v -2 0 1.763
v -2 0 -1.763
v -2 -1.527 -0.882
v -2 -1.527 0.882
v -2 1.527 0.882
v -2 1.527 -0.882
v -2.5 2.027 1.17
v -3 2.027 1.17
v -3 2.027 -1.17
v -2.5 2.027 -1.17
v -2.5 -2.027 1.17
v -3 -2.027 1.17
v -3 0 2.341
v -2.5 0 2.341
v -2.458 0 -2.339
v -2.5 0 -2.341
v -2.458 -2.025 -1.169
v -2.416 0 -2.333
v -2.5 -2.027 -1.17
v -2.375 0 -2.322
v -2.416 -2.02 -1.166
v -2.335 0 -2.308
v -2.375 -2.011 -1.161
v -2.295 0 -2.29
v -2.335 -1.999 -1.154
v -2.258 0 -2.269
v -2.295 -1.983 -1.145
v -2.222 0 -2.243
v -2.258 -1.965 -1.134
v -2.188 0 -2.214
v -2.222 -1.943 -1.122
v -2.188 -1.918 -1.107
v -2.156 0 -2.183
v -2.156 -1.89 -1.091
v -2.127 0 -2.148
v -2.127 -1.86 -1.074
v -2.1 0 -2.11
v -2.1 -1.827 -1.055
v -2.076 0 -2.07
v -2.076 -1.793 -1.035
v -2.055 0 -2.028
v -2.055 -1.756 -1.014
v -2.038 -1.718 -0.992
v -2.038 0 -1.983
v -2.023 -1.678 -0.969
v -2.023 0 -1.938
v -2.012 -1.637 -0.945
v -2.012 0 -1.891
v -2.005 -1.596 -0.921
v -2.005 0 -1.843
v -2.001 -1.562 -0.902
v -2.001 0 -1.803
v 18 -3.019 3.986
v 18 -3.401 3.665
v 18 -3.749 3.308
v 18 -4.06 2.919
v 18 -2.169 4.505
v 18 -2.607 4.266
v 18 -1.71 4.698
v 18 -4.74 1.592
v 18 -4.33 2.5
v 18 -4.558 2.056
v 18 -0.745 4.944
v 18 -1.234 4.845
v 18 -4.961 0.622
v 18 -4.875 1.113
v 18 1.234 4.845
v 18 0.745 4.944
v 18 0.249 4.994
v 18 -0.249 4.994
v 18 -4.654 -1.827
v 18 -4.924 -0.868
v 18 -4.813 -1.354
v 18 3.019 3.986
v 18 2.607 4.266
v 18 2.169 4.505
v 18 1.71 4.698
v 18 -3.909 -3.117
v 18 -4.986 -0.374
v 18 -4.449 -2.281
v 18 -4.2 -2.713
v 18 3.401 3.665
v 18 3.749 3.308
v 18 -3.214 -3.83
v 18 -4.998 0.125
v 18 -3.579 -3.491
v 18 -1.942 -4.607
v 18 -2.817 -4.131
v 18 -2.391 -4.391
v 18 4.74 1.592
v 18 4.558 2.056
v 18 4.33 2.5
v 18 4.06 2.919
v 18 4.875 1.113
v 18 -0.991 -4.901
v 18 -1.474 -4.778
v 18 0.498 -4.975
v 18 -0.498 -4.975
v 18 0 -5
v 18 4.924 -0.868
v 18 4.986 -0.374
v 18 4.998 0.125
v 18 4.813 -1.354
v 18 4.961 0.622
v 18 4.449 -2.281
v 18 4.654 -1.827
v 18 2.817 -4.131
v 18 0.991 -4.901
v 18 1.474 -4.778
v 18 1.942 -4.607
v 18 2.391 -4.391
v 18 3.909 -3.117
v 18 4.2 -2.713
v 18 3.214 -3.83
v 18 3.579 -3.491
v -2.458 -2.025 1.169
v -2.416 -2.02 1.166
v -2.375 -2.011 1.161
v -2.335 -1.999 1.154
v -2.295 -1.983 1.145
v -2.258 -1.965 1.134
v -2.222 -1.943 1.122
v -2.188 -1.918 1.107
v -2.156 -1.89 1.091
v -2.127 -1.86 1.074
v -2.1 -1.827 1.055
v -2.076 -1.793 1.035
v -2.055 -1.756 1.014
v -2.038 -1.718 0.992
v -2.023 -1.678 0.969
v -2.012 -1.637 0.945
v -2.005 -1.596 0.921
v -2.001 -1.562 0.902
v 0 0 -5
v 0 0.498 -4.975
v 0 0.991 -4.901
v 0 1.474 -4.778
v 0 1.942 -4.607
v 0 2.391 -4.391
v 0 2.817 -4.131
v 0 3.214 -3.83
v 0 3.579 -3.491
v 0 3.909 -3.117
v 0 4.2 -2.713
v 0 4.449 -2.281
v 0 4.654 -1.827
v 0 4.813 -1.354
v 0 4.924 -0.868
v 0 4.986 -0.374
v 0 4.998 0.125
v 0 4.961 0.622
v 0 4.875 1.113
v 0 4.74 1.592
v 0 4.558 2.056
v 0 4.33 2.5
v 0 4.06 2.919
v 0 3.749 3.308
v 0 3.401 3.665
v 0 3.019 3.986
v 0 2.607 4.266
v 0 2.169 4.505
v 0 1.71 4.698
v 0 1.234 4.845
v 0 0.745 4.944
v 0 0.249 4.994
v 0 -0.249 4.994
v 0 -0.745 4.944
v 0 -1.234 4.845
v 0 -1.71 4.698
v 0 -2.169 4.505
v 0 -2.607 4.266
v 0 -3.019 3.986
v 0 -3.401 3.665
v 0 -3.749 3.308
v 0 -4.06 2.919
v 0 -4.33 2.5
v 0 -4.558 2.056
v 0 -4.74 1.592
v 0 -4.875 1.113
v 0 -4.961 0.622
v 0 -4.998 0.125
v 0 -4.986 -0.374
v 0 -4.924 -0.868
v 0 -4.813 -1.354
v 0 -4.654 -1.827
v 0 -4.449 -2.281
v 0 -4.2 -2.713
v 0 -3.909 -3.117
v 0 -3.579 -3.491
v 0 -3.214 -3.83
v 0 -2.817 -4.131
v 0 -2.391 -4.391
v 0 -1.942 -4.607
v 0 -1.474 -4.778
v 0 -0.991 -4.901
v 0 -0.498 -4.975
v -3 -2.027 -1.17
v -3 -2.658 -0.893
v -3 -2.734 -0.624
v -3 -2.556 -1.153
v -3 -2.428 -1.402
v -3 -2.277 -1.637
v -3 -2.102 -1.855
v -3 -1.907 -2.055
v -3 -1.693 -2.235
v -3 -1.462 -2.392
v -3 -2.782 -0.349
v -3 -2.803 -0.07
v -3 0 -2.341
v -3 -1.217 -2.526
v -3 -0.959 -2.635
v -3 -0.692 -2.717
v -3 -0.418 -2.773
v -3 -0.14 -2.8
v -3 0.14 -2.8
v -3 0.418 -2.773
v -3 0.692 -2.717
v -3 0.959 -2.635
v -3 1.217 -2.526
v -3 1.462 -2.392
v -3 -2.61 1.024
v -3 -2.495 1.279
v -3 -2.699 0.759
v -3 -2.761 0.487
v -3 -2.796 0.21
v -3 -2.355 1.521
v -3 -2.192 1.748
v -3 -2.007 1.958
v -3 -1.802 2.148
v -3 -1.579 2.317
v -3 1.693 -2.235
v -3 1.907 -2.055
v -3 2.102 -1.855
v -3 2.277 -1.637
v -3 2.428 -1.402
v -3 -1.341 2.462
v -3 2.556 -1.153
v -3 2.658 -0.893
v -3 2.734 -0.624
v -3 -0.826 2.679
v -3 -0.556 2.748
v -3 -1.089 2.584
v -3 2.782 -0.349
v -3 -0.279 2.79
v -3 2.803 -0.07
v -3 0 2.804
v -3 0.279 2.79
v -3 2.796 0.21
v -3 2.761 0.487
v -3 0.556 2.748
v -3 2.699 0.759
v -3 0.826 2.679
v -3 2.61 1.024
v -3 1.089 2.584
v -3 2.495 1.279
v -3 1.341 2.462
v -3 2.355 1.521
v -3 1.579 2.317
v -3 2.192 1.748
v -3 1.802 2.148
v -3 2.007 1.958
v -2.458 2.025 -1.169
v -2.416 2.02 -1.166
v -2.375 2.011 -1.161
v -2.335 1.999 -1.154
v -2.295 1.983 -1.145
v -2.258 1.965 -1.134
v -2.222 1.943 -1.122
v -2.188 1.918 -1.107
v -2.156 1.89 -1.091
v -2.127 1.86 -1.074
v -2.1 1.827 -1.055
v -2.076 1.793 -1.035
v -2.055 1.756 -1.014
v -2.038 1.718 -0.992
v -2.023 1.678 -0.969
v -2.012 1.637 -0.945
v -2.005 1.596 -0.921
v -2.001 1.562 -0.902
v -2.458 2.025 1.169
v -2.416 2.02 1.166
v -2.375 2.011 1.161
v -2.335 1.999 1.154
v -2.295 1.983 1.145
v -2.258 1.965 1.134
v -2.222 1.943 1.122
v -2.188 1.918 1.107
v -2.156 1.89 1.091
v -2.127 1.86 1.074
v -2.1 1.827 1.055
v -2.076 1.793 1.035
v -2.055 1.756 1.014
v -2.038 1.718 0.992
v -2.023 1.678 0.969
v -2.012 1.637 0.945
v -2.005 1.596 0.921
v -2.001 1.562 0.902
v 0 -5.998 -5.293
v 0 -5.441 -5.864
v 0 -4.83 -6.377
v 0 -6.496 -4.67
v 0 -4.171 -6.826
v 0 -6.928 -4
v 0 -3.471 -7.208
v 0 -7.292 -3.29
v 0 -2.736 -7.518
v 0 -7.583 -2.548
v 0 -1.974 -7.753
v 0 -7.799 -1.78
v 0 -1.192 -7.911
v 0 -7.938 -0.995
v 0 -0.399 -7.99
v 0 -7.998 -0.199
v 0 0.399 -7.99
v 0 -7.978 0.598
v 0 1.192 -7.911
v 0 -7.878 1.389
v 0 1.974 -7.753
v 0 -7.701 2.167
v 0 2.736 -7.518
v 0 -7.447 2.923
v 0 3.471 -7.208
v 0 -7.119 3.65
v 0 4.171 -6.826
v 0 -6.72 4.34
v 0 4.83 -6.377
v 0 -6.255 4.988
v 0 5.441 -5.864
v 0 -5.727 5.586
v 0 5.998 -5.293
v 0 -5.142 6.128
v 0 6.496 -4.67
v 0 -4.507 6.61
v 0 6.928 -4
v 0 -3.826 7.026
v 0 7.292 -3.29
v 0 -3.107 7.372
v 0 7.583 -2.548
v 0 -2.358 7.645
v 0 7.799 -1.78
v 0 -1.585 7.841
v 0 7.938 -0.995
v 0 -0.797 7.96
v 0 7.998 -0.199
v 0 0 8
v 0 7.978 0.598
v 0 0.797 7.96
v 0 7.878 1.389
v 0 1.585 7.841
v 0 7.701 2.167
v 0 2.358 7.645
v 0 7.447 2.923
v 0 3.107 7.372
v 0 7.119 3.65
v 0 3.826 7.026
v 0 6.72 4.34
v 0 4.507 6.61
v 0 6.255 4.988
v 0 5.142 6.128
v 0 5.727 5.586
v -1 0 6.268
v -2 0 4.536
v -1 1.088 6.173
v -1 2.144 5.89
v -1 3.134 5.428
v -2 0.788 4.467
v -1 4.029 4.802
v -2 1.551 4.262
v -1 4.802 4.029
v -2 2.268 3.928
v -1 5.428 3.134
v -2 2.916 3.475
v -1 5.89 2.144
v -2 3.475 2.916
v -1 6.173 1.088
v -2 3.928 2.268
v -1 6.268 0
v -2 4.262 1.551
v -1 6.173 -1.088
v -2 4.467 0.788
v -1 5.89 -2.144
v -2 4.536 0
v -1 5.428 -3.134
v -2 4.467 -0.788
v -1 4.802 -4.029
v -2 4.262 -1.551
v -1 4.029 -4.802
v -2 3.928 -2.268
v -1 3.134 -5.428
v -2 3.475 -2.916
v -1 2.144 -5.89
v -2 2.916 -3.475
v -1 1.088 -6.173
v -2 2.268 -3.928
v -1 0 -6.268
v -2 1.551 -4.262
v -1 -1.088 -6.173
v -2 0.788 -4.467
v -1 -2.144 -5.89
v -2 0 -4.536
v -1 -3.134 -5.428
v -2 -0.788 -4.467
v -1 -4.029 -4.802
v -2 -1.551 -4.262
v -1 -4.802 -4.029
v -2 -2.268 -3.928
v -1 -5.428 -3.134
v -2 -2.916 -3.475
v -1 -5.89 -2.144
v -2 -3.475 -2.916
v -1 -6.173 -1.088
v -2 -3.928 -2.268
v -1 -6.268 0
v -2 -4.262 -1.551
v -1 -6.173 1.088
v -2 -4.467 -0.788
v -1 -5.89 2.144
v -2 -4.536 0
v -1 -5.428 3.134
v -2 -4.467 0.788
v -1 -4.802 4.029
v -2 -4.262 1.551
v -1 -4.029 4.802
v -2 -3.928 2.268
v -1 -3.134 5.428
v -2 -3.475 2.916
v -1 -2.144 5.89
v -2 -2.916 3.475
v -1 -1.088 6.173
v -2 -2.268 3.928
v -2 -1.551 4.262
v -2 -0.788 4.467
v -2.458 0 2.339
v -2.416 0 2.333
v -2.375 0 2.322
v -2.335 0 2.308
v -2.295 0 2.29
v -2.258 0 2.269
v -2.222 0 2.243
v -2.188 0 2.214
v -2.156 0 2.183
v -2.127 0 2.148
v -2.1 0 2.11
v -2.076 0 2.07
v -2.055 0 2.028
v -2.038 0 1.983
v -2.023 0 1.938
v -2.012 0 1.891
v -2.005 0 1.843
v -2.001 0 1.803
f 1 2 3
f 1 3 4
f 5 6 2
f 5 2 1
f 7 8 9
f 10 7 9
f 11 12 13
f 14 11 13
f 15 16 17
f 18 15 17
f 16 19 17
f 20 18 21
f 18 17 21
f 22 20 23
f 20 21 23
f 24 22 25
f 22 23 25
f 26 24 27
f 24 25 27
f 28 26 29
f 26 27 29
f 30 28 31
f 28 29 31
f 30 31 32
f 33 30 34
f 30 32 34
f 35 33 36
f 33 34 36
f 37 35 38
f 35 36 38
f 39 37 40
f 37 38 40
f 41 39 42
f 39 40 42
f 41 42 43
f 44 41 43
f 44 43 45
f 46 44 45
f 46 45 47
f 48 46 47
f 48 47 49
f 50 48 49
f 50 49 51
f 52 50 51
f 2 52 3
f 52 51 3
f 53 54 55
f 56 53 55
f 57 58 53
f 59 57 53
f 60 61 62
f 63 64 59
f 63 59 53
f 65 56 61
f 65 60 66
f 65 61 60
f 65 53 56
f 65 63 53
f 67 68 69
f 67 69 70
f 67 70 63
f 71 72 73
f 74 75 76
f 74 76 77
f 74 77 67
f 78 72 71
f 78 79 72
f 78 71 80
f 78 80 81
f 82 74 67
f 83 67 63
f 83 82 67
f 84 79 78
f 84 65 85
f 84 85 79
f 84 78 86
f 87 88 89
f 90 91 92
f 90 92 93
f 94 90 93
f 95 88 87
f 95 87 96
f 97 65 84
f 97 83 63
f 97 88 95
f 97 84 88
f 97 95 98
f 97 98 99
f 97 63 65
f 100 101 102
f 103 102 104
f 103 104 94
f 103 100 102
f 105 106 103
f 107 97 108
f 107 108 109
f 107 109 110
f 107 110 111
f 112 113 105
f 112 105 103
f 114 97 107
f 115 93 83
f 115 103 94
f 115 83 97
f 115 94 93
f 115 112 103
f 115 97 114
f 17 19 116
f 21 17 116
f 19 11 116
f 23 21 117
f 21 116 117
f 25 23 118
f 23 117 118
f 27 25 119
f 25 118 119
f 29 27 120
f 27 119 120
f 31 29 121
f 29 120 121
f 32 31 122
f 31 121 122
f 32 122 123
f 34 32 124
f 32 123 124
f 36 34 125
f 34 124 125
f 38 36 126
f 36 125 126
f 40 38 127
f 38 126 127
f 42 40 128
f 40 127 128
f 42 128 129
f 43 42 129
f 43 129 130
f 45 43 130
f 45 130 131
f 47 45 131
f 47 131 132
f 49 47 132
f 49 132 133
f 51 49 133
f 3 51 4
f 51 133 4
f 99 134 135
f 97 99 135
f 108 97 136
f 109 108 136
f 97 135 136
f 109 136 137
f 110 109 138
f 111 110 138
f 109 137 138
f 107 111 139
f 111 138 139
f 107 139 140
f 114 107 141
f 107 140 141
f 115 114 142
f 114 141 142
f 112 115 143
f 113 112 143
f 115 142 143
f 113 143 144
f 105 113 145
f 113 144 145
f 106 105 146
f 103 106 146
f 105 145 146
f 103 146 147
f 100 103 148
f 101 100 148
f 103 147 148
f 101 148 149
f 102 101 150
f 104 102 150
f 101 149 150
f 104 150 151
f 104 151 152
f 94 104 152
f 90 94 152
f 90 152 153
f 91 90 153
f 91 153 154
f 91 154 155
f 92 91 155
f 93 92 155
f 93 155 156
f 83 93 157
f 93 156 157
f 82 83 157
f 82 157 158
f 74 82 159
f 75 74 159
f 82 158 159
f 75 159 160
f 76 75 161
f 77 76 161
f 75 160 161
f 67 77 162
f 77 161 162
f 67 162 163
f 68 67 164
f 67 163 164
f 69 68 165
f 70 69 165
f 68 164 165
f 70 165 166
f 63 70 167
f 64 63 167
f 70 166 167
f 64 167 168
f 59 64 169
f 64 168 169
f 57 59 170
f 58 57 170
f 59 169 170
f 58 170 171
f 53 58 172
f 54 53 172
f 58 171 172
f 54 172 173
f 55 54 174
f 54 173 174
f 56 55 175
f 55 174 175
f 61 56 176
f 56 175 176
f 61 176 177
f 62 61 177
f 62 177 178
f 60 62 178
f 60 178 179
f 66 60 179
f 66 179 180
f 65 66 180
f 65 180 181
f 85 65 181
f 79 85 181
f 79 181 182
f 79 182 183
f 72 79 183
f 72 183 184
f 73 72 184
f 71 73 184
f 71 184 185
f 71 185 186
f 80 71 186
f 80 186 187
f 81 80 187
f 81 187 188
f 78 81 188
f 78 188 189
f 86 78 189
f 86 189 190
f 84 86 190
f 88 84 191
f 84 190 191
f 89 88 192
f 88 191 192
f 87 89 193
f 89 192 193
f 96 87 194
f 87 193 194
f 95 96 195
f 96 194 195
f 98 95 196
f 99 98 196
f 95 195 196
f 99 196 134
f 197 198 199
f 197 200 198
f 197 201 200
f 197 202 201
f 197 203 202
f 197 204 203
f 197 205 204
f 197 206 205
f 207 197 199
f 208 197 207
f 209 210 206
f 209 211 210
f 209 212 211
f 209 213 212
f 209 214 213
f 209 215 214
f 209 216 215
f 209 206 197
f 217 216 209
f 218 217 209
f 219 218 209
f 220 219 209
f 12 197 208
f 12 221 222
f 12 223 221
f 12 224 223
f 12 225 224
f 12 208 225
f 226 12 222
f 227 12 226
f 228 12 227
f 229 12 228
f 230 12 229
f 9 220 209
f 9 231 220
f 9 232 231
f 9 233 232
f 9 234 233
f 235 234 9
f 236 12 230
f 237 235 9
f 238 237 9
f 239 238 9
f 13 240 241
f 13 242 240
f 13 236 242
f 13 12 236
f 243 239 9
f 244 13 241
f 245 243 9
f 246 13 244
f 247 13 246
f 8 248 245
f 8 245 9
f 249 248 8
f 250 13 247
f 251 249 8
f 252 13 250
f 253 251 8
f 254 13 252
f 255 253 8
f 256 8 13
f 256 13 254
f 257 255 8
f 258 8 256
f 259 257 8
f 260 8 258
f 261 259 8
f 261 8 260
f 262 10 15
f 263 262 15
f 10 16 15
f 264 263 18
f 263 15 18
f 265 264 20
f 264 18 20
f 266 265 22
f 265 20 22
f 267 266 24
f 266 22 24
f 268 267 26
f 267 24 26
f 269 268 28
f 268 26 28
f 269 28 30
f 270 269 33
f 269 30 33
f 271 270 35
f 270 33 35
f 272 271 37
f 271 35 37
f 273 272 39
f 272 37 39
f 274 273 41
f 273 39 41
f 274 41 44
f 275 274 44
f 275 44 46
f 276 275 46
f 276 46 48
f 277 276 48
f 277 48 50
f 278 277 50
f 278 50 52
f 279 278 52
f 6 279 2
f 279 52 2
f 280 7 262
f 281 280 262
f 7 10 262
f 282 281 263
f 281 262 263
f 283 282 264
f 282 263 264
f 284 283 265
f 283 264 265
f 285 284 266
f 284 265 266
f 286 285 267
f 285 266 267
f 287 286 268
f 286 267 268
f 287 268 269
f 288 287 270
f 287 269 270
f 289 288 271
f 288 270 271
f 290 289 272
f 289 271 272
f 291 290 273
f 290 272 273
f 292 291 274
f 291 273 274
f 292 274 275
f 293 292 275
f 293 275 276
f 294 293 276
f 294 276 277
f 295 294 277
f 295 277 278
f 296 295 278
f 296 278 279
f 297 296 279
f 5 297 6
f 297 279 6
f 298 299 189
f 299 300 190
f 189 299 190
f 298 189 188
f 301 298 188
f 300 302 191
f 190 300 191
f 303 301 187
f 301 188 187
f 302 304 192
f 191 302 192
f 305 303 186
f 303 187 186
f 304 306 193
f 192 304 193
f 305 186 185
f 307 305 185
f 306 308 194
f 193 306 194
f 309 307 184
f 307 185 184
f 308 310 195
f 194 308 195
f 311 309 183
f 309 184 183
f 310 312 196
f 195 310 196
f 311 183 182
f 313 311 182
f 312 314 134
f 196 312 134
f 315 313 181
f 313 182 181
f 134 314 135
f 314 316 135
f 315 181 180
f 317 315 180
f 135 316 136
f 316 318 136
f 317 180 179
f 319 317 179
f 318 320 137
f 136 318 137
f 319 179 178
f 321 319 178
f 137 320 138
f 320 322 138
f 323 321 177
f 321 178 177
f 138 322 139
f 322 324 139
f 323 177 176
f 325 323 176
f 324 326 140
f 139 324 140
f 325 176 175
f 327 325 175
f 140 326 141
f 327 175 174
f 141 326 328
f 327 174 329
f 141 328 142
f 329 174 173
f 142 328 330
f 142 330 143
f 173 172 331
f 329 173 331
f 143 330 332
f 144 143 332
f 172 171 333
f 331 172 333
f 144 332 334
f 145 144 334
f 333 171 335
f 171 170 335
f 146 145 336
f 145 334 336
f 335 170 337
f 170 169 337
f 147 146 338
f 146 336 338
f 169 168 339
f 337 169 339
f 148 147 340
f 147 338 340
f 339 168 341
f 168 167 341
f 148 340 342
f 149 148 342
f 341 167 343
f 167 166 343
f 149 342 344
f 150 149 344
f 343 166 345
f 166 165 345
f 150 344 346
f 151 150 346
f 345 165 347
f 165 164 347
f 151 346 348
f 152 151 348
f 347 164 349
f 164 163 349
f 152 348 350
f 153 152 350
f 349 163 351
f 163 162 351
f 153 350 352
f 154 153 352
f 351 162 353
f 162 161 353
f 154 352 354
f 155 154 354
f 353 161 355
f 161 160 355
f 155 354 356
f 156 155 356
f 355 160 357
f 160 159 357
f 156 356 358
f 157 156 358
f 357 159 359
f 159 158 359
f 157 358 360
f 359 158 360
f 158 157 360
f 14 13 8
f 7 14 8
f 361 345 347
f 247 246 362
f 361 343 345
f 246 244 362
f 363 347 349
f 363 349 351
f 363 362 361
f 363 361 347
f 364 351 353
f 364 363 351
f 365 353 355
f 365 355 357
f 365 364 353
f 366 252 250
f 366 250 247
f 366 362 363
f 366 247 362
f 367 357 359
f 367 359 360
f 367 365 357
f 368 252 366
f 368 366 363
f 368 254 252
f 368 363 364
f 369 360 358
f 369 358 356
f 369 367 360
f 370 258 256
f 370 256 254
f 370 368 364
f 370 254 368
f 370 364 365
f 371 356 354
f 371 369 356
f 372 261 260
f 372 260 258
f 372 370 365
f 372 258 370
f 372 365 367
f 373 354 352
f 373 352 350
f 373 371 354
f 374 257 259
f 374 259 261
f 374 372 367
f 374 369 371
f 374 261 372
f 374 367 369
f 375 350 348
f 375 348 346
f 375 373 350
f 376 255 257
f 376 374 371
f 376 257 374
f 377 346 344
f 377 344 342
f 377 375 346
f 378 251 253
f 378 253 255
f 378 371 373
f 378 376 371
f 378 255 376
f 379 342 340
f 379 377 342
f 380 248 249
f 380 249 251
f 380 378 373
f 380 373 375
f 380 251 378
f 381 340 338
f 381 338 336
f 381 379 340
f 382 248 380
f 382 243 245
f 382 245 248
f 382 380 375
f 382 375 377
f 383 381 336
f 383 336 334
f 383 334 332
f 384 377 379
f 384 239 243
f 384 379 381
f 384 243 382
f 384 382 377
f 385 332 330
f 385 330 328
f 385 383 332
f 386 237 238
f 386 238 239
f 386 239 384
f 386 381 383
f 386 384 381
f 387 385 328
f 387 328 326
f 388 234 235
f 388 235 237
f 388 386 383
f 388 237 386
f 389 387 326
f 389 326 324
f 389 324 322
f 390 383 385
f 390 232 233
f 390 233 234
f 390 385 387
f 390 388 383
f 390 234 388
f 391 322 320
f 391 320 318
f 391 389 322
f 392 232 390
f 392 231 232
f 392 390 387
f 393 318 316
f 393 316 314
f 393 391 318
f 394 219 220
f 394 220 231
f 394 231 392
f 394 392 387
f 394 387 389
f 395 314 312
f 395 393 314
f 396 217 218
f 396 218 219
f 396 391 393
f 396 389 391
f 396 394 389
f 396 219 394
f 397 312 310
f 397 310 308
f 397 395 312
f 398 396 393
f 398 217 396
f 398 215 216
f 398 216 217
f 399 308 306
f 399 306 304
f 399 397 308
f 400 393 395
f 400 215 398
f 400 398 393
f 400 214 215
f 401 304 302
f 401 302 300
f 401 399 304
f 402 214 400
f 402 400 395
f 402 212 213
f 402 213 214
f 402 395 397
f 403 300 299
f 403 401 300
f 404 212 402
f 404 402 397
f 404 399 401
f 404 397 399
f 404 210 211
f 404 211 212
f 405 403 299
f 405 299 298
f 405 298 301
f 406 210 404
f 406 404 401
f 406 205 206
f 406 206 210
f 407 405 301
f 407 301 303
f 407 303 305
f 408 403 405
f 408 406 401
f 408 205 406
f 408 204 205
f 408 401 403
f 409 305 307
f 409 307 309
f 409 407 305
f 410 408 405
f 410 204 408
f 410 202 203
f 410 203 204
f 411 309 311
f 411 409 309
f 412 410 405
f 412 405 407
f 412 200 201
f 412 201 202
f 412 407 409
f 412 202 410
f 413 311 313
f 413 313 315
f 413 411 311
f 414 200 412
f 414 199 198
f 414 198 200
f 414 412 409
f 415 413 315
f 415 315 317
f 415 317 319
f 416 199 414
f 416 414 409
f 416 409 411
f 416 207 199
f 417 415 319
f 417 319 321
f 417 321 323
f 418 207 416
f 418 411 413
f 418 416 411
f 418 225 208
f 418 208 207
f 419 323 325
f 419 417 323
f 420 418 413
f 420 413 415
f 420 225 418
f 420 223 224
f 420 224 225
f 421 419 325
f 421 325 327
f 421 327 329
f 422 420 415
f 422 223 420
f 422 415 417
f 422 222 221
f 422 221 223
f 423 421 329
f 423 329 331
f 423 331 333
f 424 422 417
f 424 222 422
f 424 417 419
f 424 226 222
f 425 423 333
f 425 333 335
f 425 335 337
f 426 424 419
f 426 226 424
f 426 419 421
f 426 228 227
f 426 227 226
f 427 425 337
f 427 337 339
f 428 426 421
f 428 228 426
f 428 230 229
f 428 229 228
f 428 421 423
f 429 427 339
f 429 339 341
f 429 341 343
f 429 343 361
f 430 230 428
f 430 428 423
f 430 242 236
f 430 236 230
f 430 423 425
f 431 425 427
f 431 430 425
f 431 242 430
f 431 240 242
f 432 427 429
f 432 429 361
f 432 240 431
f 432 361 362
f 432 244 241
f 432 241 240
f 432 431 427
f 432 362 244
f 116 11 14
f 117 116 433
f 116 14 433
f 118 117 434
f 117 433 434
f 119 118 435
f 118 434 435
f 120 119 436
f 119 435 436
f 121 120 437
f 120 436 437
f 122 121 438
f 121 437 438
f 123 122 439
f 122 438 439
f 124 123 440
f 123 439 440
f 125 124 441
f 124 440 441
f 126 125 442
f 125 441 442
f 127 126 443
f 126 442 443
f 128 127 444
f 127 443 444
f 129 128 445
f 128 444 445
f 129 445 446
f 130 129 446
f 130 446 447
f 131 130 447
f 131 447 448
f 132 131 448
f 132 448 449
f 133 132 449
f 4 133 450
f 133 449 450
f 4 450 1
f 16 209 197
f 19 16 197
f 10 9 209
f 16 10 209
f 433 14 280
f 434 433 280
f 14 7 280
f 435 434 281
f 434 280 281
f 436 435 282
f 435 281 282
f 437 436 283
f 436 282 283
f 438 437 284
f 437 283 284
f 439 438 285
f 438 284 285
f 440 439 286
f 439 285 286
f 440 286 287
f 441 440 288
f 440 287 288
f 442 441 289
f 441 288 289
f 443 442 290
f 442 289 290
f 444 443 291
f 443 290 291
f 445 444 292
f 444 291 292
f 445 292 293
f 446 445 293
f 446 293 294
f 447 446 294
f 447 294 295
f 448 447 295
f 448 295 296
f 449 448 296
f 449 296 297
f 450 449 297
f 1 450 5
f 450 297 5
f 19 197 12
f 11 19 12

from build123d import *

# Parameters (mm, degrees)
SKETCH1_R           = 5
BOSS_EXTRUDE1_DEPTH = 18
SKETCH2_R           = 8
BOSS_EXTRUDE2_DEPTH = 3
BOSS_EXTRUDE2_TAPER = 60
CUT_EXTRUDE1_DEPTH  = 1
FILLET1_R           = 0.5


with BuildPart() as part:
    # Sketch1 → Boss-Extrude1 (new body)
    with BuildSketch(Plane(origin=(0, 0, 0), x_dir=(0, 0, -1), z_dir=(1, 0, 0))):
        Circle(SKETCH1_R)
    extrude(amount=BOSS_EXTRUDE1_DEPTH)

    # Sketch2 → Boss-Extrude2 (add)
    with BuildSketch(Plane.ZY):
        Circle(SKETCH2_R)
    extrude(amount=BOSS_EXTRUDE2_DEPTH, taper=BOSS_EXTRUDE2_TAPER)

    # Sketch4 → Cut-Extrude1 (cut)
    with BuildSketch(Plane.ZY.offset(3)):
        Polygon((2.340832904, 0), (1.170416452, 2.027220761), (-1.170416452, 2.027220761), (-2.340832904, 0), (-1.170416452, -2.027220761), (1.170416452, -2.027220761), align=None)
    extrude(amount=-CUT_EXTRUDE1_DEPTH, mode=Mode.SUBTRACT)

    # Fillet1
    fillet1_edges = [part.edges().sort_by_distance(p)[0] for p in [
        (-2, -1.01361038, 1.755624678),
        (-2, -2.027220761, 0),
        (-2, -1.01361038, -1.755624678),
        (-2, 1.01361038, -1.755624678),
        (-2, 2.027220761, 0),
        (-2, 1.01361038, 1.755624678),
    ]]
    fillet(fillet1_edges, radius=FILLET1_R)


solid = part.part
